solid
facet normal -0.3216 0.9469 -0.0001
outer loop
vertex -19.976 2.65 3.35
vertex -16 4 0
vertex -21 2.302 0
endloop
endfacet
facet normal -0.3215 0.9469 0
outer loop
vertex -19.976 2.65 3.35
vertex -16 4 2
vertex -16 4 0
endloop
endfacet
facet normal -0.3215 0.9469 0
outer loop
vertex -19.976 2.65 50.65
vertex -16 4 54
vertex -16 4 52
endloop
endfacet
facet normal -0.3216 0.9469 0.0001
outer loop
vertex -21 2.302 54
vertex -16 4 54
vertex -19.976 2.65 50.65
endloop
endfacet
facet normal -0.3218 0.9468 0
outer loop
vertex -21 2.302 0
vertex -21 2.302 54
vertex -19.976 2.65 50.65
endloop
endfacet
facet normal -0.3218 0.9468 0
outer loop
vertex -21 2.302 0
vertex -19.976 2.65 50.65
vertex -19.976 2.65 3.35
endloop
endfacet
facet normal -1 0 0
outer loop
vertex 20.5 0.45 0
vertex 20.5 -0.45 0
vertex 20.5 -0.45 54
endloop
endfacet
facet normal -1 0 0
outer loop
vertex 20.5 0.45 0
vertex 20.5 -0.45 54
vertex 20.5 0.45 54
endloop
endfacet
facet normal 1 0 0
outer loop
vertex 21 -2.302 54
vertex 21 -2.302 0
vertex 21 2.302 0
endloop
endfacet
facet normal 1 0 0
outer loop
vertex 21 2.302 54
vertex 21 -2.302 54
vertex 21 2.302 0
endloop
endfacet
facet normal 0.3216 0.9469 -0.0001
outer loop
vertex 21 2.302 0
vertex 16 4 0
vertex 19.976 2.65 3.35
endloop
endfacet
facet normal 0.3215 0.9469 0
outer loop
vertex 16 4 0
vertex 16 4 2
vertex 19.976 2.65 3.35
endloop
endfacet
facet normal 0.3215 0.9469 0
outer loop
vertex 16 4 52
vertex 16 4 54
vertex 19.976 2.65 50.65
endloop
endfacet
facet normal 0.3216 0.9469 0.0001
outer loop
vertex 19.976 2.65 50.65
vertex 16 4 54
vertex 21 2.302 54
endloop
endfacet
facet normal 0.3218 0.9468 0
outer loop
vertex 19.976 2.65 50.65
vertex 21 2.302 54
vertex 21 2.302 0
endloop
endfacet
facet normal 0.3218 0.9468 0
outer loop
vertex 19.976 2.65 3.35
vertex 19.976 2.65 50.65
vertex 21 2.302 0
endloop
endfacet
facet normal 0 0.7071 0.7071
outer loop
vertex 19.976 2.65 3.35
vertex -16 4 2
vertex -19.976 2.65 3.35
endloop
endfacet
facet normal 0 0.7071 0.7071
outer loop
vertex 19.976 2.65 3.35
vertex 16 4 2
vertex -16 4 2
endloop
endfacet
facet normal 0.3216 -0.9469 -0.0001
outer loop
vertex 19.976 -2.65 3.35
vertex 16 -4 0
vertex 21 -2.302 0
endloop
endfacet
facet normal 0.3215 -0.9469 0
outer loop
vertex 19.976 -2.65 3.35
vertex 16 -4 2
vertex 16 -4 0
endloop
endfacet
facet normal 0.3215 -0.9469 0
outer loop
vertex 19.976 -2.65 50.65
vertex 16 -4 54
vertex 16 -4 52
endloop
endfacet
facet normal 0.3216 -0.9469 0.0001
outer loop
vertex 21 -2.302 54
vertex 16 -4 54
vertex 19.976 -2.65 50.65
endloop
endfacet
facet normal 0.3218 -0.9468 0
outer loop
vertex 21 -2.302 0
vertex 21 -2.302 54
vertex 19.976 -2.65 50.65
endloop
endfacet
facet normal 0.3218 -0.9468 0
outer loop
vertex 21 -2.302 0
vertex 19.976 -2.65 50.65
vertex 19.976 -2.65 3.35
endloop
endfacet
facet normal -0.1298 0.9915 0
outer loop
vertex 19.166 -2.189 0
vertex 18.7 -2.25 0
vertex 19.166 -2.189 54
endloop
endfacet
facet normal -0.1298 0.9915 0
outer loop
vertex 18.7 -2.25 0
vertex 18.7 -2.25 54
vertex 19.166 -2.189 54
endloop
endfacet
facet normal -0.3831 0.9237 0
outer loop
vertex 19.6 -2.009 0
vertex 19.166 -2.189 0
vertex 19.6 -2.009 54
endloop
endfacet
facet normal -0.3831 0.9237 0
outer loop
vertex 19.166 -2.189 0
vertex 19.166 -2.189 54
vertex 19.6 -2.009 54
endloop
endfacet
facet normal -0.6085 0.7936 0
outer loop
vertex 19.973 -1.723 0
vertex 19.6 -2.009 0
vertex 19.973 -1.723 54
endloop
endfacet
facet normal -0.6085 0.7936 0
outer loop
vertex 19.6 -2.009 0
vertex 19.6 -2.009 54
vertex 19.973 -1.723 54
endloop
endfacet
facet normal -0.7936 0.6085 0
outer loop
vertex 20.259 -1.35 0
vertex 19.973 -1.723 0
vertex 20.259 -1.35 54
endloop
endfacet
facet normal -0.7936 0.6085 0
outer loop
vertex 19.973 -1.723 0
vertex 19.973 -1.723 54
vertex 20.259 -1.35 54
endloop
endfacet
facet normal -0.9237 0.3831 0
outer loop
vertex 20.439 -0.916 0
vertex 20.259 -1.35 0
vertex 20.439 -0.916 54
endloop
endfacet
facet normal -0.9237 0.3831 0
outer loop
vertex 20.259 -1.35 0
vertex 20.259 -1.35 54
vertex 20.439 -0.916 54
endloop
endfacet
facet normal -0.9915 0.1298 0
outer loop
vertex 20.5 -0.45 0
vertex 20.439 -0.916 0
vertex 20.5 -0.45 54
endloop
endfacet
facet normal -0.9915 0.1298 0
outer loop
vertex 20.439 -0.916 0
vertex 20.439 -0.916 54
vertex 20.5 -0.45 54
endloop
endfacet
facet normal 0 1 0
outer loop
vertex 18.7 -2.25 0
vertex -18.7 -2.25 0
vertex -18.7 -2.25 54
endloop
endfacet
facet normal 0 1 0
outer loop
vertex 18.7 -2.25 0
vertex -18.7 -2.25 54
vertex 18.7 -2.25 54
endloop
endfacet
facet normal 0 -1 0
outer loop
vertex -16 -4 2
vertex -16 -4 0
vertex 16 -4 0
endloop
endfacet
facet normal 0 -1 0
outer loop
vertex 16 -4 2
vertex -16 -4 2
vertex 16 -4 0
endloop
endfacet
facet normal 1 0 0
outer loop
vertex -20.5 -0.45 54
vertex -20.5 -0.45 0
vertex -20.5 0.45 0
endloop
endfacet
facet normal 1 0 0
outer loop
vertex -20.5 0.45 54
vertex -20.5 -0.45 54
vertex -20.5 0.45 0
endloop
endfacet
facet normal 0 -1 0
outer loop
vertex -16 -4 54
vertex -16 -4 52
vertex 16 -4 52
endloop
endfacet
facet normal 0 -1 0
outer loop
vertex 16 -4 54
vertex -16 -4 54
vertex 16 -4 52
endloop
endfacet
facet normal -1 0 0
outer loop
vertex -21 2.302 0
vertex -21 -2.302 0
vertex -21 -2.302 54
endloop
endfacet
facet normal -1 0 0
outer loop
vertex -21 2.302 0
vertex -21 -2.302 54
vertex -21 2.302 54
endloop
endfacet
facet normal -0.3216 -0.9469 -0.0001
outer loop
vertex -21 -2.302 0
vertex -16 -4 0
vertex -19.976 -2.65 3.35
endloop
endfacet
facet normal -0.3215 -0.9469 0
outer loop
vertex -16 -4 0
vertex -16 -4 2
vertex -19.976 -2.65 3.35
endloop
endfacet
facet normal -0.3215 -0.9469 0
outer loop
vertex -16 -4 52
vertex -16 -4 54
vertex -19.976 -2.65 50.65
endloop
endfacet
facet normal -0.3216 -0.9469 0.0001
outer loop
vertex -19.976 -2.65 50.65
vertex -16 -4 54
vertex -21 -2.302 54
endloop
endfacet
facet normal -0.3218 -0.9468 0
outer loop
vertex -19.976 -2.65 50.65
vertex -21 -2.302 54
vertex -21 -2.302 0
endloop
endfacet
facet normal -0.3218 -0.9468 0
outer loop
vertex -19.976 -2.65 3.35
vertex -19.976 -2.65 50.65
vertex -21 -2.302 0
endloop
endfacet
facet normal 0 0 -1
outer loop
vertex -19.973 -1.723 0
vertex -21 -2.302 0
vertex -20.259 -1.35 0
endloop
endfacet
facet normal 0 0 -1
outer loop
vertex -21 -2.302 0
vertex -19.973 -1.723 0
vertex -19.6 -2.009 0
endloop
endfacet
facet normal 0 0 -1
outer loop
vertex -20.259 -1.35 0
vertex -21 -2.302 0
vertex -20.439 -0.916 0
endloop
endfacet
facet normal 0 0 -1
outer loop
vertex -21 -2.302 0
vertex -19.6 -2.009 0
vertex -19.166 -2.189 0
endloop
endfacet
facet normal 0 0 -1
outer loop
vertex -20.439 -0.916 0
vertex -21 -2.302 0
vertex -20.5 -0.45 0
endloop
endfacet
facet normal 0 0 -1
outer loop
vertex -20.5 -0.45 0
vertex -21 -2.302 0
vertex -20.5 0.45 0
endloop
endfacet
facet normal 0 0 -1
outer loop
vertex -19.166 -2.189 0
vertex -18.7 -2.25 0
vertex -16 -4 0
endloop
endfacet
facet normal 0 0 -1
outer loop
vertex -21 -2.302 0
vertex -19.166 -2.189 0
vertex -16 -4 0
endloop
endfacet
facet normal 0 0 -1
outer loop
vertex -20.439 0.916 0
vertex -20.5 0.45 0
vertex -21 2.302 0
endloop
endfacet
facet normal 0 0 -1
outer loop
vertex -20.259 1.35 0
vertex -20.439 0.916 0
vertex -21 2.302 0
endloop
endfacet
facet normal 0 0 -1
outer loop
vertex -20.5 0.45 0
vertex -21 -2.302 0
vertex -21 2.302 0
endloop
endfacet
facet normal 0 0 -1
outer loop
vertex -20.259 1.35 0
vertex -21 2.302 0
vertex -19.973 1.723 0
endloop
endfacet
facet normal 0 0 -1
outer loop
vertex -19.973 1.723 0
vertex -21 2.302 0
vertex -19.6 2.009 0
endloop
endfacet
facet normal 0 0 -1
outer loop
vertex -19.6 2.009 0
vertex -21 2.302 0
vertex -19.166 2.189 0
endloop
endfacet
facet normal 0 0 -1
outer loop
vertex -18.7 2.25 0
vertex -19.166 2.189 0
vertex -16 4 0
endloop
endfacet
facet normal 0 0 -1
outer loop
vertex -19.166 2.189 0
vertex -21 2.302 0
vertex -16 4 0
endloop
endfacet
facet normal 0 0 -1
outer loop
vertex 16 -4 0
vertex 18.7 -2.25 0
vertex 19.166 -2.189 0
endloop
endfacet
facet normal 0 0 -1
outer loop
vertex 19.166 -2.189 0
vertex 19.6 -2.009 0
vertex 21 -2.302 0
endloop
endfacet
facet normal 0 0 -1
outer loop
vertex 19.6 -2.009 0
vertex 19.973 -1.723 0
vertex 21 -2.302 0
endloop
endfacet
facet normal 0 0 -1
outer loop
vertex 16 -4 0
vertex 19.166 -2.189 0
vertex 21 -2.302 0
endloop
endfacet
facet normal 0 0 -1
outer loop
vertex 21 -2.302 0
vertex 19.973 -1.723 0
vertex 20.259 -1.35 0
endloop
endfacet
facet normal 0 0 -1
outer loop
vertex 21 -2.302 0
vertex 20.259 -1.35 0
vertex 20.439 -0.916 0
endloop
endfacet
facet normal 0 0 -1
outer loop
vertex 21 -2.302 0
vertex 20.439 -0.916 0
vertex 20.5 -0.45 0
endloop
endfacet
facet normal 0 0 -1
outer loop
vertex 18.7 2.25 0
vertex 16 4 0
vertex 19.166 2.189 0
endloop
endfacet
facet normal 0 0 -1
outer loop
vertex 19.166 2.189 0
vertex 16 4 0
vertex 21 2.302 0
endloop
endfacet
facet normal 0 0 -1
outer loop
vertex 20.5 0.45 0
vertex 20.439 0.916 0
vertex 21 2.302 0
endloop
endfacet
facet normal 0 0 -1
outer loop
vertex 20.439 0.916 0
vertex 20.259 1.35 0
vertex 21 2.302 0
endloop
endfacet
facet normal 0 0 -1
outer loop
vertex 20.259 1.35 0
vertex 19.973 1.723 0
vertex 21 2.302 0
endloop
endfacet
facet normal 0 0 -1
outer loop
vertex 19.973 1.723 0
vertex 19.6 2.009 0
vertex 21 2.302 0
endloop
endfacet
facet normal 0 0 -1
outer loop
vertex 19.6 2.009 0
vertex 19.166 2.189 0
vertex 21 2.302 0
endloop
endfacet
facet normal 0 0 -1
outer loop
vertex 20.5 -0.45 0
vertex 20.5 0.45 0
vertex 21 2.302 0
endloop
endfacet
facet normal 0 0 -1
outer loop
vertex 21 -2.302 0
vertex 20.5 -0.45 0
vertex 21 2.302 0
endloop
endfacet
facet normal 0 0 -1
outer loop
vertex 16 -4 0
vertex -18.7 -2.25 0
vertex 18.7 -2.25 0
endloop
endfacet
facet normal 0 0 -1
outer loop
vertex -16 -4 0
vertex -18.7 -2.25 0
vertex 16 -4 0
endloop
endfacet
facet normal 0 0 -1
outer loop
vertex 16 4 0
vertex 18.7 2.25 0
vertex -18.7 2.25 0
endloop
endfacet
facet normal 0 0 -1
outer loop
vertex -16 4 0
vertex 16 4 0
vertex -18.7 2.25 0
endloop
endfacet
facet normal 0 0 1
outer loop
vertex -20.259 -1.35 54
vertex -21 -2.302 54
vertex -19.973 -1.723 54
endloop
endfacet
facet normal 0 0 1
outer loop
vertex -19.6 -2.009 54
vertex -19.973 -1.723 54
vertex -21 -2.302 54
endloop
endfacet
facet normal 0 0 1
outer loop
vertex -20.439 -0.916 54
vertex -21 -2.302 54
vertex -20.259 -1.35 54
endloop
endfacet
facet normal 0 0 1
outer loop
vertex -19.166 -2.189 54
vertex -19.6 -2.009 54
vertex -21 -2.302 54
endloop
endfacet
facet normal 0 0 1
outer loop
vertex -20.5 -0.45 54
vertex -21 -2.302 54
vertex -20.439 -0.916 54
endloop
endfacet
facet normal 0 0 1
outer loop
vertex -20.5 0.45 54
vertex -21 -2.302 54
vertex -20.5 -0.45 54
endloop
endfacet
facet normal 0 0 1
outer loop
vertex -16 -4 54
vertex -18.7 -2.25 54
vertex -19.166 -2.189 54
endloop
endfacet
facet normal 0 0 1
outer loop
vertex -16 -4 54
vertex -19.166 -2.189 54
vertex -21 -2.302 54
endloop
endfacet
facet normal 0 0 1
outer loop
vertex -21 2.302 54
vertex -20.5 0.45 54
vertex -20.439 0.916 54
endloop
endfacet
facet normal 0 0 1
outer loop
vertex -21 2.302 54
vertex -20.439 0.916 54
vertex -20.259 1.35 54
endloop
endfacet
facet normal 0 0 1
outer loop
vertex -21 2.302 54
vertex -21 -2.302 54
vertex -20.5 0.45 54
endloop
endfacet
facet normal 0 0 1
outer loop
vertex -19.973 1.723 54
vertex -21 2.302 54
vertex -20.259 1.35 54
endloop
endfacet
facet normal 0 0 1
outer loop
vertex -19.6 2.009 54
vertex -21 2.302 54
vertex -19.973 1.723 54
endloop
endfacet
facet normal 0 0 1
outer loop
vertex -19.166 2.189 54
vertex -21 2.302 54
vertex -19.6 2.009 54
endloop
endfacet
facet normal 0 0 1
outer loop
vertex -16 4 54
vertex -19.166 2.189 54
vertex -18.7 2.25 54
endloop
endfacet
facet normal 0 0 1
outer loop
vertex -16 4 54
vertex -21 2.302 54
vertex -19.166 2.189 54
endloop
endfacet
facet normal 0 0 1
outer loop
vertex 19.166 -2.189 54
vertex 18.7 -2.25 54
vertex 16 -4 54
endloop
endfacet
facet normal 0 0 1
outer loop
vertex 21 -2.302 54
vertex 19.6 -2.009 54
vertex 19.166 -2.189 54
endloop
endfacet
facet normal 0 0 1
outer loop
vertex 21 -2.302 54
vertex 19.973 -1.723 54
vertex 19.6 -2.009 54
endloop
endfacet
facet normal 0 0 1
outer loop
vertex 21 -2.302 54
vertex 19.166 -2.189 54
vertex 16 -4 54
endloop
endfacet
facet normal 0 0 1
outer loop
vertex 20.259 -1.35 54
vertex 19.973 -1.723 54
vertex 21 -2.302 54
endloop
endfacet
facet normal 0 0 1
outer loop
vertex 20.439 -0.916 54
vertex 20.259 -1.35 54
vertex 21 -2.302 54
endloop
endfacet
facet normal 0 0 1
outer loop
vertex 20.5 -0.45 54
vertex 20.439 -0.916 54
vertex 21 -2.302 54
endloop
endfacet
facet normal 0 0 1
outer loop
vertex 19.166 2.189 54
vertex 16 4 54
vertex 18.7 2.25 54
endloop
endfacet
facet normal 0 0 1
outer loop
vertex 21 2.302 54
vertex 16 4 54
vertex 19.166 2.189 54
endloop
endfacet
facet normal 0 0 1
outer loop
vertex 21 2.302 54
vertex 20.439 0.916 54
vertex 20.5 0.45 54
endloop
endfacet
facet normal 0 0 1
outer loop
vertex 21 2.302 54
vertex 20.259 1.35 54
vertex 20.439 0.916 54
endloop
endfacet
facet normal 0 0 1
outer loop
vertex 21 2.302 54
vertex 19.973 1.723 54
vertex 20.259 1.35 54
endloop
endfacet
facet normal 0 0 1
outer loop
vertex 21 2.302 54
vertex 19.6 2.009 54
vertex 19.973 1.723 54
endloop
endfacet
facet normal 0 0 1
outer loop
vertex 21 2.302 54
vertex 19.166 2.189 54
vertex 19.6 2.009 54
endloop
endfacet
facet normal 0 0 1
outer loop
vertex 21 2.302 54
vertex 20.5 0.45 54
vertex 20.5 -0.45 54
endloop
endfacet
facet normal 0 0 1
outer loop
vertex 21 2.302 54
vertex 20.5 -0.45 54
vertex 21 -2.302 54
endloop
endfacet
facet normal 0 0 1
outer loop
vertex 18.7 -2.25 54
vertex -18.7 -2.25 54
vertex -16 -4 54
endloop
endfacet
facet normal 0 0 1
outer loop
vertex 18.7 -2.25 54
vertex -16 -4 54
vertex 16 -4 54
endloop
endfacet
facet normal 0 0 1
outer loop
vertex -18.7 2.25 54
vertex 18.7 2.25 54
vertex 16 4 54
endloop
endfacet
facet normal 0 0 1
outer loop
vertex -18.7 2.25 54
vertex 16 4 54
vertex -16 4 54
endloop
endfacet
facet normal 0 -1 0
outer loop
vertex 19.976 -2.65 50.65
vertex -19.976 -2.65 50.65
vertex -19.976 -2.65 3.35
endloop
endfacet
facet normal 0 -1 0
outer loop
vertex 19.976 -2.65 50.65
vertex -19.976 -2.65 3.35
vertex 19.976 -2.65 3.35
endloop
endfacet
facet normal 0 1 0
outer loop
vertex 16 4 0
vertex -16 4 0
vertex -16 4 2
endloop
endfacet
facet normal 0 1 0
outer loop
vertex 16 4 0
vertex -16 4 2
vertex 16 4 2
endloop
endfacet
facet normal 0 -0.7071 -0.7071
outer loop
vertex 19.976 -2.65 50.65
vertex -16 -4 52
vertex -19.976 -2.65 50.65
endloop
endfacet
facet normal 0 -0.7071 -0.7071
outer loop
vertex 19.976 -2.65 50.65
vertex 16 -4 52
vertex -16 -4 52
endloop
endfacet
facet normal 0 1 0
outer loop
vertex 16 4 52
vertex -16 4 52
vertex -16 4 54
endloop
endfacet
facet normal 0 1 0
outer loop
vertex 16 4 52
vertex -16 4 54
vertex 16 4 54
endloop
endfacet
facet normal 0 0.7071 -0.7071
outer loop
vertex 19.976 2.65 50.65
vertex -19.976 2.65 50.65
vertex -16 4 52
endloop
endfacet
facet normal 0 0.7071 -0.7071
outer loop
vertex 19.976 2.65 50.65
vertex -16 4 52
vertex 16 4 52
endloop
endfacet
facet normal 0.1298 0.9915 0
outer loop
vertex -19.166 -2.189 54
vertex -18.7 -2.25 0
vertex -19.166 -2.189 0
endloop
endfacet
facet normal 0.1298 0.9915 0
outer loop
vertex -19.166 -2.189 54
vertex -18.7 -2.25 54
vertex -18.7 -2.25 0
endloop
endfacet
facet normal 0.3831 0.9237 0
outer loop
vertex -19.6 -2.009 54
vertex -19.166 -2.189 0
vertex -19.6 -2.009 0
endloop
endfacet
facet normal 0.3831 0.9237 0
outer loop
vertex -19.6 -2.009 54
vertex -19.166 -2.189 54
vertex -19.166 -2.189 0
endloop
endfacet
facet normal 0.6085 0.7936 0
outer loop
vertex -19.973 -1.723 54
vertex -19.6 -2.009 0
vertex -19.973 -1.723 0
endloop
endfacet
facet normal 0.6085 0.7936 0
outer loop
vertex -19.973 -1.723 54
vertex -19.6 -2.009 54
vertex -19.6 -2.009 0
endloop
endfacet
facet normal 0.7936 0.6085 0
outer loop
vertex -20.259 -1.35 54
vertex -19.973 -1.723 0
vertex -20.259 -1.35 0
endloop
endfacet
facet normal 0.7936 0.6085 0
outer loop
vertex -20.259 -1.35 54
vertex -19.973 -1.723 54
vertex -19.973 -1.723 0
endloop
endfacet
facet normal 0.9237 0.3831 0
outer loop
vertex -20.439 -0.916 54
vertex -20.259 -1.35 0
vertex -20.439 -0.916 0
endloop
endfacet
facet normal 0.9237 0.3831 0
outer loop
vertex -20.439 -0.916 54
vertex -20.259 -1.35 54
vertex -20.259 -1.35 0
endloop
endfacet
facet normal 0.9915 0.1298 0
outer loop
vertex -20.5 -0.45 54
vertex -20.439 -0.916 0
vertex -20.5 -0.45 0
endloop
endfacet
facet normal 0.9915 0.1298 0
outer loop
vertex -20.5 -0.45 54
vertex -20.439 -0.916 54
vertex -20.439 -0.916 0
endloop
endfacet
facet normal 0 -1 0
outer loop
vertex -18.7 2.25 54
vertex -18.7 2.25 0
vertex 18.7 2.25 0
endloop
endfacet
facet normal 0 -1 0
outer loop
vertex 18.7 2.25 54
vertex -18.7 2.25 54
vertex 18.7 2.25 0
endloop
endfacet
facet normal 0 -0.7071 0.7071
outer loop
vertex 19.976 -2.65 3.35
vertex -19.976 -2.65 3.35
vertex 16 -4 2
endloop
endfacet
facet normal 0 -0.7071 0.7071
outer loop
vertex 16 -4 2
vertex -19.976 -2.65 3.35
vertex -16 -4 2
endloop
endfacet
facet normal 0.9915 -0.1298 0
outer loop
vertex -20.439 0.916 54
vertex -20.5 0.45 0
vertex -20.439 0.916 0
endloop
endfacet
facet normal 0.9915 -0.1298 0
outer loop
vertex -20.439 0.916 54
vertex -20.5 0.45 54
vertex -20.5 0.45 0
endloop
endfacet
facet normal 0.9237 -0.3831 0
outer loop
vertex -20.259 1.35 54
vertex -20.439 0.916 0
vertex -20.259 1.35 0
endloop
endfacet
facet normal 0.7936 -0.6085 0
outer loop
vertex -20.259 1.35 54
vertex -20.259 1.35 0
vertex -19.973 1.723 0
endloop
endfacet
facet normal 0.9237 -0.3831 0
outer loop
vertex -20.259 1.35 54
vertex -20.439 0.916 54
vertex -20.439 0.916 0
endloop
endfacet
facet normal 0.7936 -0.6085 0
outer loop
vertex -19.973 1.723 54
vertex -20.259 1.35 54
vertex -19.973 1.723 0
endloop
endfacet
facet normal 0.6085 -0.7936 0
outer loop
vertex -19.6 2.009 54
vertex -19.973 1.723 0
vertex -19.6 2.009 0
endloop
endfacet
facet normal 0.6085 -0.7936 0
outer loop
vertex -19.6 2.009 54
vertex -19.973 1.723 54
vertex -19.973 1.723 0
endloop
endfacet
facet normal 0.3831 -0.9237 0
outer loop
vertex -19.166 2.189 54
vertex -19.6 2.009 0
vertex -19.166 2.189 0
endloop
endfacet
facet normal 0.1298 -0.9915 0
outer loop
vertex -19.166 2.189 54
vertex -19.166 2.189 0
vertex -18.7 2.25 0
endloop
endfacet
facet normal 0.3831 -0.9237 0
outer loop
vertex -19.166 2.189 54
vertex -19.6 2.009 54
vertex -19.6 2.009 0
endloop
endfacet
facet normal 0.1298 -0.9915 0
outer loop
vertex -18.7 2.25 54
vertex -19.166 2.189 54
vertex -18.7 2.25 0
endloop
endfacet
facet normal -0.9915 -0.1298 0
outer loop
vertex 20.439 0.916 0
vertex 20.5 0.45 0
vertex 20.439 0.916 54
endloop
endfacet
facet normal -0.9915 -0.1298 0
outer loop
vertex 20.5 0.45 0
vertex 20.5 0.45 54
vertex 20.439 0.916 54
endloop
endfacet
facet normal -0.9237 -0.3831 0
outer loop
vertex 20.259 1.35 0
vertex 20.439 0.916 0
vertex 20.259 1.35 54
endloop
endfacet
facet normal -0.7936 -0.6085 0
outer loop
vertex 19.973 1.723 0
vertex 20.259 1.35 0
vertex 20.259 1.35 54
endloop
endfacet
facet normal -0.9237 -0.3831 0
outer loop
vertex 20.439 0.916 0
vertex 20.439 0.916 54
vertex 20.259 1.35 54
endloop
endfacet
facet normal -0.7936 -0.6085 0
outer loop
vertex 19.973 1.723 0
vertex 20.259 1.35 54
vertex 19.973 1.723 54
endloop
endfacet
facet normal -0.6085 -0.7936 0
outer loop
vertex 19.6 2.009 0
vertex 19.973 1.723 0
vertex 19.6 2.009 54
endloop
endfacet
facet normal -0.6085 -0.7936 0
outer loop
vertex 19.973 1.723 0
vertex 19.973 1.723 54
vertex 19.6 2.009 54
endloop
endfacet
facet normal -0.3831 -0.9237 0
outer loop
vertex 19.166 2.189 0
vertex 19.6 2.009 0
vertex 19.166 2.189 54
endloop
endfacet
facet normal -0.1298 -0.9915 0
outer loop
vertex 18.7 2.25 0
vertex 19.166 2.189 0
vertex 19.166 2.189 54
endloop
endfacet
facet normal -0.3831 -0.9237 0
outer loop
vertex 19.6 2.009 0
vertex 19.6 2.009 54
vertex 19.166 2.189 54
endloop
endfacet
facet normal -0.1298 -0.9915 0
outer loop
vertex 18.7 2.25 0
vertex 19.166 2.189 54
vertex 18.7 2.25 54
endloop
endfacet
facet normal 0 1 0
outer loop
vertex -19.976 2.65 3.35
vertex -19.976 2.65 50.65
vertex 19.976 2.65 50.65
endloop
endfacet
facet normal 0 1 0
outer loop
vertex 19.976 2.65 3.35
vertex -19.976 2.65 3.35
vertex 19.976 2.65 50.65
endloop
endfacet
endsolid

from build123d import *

# Parameters (mm, degrees)
SKETCH1_W            = 42
SKETCH1_H            = 8
SKETCH1_W_2          = 41
SKETCH1_H_2          = 4.5
BOSS_EXTRUDE1_DEPTH  = 54
CUT_EXTRUDE1_REACH   = 60.078
MIRROR2_COPY_1_REACH = 60.078
FILLET1_R            = 1.8
CUT_EXTRUDE2_START   = -2
SKETCH3_OUTSIDE_W    = 57.776
SKETCH3_OUTSIDE_H    = 23.776
SKETCH3_OUTSIDE_W_2  = 42
SKETCH3_OUTSIDE_H_2  = 5.3
CUT_EXTRUDE2_DEPTH   = 50
CHAMFER1_SIZE        = 1.35


with BuildPart() as part:
    # Sketch1 → Boss-Extrude1 (new body)
    with BuildSketch(Plane.XY):
        Rectangle(SKETCH1_W, SKETCH1_H)
        Rectangle(SKETCH1_W_2, SKETCH1_H_2, mode=Mode.SUBTRACT)
    extrude(amount=BOSS_EXTRUDE1_DEPTH)

    # Sketch2 → Cut-Extrude1 (cut, up to next)
    with BuildSketch(Plane.XY.offset(54), mode=Mode.PRIVATE) as cut_extrude1_sk1:
        Polygon((-16, 4), (-21, 2.302178038), (-21, 4), align=None)
    cut_extrude1_tool1 = extrude(cut_extrude1_sk1.sketch, amount=-CUT_EXTRUDE1_REACH, mode=Mode.PRIVATE) & part.part
    cut_extrude1 = cut_extrude1_tool1.solids().sort_by_distance((-19.333333, 3.434059, 54))[0]
    add(cut_extrude1, mode=Mode.SUBTRACT)

    # Mirror1: Cut-Extrude1 across plane
    add(cut_extrude1.mirror(Plane.ZX), mode=Mode.SUBTRACT)

    # Mirror2: Cut-Extrude1 across plane
    add(cut_extrude1.mirror(Plane(origin=(0, 0, 0), x_dir=(0, 0, 1), z_dir=(1, 0, 0))), mode=Mode.SUBTRACT)

    # Mirror2 copy 1 sketch → Mirror2 copy 1 (cut, up to next)
    with BuildSketch(Plane(origin=(0, 0, 54), x_dir=(-1, 0, 0), z_dir=(0, 0, 1)), mode=Mode.PRIVATE) as mirror2_copy_1_sk1:
        Polygon((-16, 4), (-21, 2.302178038), (-21, 4), align=None)
    mirror2_copy_1_tool1 = extrude(mirror2_copy_1_sk1.sketch, amount=-MIRROR2_COPY_1_REACH, mode=Mode.PRIVATE) & part.part
    add(mirror2_copy_1_tool1.solids().sort_by_distance((19.333333, -3.434059, 54))[0], mode=Mode.SUBTRACT)

    # Fillet1
    fillet1_edges = [part.edges().sort_by_distance(p)[0] for p in [
        (-20.5, 2.25, 27),
        (-20.5, -2.25, 27),
        (20.5, -2.25, 27),
        (20.5, 2.25, 27),
    ]]
    fillet(fillet1_edges, radius=FILLET1_R)

    # Sketch3 outside → Cut-Extrude2 (cut)
    with BuildSketch(Plane.XY.offset(54).offset(CUT_EXTRUDE2_START)):
        Rectangle(SKETCH3_OUTSIDE_W, SKETCH3_OUTSIDE_H)
        Rectangle(SKETCH3_OUTSIDE_W_2, SKETCH3_OUTSIDE_H_2, mode=Mode.SUBTRACT)
    extrude(amount=-CUT_EXTRUDE2_DEPTH, mode=Mode.SUBTRACT)

    # Chamfer1
    chamfer1_edges = [part.edges().sort_by_distance(p)[0] for p in [
        (0, -2.65, 2),
        (0, -2.65, 52),
        (0, 2.65, 52),
        (0, 2.65, 2),
    ]]
    chamfer(chamfer1_edges, length=CHAMFER1_SIZE - 0.0001)  # a hair under: the kernel refuses the full size


solid = part.part
